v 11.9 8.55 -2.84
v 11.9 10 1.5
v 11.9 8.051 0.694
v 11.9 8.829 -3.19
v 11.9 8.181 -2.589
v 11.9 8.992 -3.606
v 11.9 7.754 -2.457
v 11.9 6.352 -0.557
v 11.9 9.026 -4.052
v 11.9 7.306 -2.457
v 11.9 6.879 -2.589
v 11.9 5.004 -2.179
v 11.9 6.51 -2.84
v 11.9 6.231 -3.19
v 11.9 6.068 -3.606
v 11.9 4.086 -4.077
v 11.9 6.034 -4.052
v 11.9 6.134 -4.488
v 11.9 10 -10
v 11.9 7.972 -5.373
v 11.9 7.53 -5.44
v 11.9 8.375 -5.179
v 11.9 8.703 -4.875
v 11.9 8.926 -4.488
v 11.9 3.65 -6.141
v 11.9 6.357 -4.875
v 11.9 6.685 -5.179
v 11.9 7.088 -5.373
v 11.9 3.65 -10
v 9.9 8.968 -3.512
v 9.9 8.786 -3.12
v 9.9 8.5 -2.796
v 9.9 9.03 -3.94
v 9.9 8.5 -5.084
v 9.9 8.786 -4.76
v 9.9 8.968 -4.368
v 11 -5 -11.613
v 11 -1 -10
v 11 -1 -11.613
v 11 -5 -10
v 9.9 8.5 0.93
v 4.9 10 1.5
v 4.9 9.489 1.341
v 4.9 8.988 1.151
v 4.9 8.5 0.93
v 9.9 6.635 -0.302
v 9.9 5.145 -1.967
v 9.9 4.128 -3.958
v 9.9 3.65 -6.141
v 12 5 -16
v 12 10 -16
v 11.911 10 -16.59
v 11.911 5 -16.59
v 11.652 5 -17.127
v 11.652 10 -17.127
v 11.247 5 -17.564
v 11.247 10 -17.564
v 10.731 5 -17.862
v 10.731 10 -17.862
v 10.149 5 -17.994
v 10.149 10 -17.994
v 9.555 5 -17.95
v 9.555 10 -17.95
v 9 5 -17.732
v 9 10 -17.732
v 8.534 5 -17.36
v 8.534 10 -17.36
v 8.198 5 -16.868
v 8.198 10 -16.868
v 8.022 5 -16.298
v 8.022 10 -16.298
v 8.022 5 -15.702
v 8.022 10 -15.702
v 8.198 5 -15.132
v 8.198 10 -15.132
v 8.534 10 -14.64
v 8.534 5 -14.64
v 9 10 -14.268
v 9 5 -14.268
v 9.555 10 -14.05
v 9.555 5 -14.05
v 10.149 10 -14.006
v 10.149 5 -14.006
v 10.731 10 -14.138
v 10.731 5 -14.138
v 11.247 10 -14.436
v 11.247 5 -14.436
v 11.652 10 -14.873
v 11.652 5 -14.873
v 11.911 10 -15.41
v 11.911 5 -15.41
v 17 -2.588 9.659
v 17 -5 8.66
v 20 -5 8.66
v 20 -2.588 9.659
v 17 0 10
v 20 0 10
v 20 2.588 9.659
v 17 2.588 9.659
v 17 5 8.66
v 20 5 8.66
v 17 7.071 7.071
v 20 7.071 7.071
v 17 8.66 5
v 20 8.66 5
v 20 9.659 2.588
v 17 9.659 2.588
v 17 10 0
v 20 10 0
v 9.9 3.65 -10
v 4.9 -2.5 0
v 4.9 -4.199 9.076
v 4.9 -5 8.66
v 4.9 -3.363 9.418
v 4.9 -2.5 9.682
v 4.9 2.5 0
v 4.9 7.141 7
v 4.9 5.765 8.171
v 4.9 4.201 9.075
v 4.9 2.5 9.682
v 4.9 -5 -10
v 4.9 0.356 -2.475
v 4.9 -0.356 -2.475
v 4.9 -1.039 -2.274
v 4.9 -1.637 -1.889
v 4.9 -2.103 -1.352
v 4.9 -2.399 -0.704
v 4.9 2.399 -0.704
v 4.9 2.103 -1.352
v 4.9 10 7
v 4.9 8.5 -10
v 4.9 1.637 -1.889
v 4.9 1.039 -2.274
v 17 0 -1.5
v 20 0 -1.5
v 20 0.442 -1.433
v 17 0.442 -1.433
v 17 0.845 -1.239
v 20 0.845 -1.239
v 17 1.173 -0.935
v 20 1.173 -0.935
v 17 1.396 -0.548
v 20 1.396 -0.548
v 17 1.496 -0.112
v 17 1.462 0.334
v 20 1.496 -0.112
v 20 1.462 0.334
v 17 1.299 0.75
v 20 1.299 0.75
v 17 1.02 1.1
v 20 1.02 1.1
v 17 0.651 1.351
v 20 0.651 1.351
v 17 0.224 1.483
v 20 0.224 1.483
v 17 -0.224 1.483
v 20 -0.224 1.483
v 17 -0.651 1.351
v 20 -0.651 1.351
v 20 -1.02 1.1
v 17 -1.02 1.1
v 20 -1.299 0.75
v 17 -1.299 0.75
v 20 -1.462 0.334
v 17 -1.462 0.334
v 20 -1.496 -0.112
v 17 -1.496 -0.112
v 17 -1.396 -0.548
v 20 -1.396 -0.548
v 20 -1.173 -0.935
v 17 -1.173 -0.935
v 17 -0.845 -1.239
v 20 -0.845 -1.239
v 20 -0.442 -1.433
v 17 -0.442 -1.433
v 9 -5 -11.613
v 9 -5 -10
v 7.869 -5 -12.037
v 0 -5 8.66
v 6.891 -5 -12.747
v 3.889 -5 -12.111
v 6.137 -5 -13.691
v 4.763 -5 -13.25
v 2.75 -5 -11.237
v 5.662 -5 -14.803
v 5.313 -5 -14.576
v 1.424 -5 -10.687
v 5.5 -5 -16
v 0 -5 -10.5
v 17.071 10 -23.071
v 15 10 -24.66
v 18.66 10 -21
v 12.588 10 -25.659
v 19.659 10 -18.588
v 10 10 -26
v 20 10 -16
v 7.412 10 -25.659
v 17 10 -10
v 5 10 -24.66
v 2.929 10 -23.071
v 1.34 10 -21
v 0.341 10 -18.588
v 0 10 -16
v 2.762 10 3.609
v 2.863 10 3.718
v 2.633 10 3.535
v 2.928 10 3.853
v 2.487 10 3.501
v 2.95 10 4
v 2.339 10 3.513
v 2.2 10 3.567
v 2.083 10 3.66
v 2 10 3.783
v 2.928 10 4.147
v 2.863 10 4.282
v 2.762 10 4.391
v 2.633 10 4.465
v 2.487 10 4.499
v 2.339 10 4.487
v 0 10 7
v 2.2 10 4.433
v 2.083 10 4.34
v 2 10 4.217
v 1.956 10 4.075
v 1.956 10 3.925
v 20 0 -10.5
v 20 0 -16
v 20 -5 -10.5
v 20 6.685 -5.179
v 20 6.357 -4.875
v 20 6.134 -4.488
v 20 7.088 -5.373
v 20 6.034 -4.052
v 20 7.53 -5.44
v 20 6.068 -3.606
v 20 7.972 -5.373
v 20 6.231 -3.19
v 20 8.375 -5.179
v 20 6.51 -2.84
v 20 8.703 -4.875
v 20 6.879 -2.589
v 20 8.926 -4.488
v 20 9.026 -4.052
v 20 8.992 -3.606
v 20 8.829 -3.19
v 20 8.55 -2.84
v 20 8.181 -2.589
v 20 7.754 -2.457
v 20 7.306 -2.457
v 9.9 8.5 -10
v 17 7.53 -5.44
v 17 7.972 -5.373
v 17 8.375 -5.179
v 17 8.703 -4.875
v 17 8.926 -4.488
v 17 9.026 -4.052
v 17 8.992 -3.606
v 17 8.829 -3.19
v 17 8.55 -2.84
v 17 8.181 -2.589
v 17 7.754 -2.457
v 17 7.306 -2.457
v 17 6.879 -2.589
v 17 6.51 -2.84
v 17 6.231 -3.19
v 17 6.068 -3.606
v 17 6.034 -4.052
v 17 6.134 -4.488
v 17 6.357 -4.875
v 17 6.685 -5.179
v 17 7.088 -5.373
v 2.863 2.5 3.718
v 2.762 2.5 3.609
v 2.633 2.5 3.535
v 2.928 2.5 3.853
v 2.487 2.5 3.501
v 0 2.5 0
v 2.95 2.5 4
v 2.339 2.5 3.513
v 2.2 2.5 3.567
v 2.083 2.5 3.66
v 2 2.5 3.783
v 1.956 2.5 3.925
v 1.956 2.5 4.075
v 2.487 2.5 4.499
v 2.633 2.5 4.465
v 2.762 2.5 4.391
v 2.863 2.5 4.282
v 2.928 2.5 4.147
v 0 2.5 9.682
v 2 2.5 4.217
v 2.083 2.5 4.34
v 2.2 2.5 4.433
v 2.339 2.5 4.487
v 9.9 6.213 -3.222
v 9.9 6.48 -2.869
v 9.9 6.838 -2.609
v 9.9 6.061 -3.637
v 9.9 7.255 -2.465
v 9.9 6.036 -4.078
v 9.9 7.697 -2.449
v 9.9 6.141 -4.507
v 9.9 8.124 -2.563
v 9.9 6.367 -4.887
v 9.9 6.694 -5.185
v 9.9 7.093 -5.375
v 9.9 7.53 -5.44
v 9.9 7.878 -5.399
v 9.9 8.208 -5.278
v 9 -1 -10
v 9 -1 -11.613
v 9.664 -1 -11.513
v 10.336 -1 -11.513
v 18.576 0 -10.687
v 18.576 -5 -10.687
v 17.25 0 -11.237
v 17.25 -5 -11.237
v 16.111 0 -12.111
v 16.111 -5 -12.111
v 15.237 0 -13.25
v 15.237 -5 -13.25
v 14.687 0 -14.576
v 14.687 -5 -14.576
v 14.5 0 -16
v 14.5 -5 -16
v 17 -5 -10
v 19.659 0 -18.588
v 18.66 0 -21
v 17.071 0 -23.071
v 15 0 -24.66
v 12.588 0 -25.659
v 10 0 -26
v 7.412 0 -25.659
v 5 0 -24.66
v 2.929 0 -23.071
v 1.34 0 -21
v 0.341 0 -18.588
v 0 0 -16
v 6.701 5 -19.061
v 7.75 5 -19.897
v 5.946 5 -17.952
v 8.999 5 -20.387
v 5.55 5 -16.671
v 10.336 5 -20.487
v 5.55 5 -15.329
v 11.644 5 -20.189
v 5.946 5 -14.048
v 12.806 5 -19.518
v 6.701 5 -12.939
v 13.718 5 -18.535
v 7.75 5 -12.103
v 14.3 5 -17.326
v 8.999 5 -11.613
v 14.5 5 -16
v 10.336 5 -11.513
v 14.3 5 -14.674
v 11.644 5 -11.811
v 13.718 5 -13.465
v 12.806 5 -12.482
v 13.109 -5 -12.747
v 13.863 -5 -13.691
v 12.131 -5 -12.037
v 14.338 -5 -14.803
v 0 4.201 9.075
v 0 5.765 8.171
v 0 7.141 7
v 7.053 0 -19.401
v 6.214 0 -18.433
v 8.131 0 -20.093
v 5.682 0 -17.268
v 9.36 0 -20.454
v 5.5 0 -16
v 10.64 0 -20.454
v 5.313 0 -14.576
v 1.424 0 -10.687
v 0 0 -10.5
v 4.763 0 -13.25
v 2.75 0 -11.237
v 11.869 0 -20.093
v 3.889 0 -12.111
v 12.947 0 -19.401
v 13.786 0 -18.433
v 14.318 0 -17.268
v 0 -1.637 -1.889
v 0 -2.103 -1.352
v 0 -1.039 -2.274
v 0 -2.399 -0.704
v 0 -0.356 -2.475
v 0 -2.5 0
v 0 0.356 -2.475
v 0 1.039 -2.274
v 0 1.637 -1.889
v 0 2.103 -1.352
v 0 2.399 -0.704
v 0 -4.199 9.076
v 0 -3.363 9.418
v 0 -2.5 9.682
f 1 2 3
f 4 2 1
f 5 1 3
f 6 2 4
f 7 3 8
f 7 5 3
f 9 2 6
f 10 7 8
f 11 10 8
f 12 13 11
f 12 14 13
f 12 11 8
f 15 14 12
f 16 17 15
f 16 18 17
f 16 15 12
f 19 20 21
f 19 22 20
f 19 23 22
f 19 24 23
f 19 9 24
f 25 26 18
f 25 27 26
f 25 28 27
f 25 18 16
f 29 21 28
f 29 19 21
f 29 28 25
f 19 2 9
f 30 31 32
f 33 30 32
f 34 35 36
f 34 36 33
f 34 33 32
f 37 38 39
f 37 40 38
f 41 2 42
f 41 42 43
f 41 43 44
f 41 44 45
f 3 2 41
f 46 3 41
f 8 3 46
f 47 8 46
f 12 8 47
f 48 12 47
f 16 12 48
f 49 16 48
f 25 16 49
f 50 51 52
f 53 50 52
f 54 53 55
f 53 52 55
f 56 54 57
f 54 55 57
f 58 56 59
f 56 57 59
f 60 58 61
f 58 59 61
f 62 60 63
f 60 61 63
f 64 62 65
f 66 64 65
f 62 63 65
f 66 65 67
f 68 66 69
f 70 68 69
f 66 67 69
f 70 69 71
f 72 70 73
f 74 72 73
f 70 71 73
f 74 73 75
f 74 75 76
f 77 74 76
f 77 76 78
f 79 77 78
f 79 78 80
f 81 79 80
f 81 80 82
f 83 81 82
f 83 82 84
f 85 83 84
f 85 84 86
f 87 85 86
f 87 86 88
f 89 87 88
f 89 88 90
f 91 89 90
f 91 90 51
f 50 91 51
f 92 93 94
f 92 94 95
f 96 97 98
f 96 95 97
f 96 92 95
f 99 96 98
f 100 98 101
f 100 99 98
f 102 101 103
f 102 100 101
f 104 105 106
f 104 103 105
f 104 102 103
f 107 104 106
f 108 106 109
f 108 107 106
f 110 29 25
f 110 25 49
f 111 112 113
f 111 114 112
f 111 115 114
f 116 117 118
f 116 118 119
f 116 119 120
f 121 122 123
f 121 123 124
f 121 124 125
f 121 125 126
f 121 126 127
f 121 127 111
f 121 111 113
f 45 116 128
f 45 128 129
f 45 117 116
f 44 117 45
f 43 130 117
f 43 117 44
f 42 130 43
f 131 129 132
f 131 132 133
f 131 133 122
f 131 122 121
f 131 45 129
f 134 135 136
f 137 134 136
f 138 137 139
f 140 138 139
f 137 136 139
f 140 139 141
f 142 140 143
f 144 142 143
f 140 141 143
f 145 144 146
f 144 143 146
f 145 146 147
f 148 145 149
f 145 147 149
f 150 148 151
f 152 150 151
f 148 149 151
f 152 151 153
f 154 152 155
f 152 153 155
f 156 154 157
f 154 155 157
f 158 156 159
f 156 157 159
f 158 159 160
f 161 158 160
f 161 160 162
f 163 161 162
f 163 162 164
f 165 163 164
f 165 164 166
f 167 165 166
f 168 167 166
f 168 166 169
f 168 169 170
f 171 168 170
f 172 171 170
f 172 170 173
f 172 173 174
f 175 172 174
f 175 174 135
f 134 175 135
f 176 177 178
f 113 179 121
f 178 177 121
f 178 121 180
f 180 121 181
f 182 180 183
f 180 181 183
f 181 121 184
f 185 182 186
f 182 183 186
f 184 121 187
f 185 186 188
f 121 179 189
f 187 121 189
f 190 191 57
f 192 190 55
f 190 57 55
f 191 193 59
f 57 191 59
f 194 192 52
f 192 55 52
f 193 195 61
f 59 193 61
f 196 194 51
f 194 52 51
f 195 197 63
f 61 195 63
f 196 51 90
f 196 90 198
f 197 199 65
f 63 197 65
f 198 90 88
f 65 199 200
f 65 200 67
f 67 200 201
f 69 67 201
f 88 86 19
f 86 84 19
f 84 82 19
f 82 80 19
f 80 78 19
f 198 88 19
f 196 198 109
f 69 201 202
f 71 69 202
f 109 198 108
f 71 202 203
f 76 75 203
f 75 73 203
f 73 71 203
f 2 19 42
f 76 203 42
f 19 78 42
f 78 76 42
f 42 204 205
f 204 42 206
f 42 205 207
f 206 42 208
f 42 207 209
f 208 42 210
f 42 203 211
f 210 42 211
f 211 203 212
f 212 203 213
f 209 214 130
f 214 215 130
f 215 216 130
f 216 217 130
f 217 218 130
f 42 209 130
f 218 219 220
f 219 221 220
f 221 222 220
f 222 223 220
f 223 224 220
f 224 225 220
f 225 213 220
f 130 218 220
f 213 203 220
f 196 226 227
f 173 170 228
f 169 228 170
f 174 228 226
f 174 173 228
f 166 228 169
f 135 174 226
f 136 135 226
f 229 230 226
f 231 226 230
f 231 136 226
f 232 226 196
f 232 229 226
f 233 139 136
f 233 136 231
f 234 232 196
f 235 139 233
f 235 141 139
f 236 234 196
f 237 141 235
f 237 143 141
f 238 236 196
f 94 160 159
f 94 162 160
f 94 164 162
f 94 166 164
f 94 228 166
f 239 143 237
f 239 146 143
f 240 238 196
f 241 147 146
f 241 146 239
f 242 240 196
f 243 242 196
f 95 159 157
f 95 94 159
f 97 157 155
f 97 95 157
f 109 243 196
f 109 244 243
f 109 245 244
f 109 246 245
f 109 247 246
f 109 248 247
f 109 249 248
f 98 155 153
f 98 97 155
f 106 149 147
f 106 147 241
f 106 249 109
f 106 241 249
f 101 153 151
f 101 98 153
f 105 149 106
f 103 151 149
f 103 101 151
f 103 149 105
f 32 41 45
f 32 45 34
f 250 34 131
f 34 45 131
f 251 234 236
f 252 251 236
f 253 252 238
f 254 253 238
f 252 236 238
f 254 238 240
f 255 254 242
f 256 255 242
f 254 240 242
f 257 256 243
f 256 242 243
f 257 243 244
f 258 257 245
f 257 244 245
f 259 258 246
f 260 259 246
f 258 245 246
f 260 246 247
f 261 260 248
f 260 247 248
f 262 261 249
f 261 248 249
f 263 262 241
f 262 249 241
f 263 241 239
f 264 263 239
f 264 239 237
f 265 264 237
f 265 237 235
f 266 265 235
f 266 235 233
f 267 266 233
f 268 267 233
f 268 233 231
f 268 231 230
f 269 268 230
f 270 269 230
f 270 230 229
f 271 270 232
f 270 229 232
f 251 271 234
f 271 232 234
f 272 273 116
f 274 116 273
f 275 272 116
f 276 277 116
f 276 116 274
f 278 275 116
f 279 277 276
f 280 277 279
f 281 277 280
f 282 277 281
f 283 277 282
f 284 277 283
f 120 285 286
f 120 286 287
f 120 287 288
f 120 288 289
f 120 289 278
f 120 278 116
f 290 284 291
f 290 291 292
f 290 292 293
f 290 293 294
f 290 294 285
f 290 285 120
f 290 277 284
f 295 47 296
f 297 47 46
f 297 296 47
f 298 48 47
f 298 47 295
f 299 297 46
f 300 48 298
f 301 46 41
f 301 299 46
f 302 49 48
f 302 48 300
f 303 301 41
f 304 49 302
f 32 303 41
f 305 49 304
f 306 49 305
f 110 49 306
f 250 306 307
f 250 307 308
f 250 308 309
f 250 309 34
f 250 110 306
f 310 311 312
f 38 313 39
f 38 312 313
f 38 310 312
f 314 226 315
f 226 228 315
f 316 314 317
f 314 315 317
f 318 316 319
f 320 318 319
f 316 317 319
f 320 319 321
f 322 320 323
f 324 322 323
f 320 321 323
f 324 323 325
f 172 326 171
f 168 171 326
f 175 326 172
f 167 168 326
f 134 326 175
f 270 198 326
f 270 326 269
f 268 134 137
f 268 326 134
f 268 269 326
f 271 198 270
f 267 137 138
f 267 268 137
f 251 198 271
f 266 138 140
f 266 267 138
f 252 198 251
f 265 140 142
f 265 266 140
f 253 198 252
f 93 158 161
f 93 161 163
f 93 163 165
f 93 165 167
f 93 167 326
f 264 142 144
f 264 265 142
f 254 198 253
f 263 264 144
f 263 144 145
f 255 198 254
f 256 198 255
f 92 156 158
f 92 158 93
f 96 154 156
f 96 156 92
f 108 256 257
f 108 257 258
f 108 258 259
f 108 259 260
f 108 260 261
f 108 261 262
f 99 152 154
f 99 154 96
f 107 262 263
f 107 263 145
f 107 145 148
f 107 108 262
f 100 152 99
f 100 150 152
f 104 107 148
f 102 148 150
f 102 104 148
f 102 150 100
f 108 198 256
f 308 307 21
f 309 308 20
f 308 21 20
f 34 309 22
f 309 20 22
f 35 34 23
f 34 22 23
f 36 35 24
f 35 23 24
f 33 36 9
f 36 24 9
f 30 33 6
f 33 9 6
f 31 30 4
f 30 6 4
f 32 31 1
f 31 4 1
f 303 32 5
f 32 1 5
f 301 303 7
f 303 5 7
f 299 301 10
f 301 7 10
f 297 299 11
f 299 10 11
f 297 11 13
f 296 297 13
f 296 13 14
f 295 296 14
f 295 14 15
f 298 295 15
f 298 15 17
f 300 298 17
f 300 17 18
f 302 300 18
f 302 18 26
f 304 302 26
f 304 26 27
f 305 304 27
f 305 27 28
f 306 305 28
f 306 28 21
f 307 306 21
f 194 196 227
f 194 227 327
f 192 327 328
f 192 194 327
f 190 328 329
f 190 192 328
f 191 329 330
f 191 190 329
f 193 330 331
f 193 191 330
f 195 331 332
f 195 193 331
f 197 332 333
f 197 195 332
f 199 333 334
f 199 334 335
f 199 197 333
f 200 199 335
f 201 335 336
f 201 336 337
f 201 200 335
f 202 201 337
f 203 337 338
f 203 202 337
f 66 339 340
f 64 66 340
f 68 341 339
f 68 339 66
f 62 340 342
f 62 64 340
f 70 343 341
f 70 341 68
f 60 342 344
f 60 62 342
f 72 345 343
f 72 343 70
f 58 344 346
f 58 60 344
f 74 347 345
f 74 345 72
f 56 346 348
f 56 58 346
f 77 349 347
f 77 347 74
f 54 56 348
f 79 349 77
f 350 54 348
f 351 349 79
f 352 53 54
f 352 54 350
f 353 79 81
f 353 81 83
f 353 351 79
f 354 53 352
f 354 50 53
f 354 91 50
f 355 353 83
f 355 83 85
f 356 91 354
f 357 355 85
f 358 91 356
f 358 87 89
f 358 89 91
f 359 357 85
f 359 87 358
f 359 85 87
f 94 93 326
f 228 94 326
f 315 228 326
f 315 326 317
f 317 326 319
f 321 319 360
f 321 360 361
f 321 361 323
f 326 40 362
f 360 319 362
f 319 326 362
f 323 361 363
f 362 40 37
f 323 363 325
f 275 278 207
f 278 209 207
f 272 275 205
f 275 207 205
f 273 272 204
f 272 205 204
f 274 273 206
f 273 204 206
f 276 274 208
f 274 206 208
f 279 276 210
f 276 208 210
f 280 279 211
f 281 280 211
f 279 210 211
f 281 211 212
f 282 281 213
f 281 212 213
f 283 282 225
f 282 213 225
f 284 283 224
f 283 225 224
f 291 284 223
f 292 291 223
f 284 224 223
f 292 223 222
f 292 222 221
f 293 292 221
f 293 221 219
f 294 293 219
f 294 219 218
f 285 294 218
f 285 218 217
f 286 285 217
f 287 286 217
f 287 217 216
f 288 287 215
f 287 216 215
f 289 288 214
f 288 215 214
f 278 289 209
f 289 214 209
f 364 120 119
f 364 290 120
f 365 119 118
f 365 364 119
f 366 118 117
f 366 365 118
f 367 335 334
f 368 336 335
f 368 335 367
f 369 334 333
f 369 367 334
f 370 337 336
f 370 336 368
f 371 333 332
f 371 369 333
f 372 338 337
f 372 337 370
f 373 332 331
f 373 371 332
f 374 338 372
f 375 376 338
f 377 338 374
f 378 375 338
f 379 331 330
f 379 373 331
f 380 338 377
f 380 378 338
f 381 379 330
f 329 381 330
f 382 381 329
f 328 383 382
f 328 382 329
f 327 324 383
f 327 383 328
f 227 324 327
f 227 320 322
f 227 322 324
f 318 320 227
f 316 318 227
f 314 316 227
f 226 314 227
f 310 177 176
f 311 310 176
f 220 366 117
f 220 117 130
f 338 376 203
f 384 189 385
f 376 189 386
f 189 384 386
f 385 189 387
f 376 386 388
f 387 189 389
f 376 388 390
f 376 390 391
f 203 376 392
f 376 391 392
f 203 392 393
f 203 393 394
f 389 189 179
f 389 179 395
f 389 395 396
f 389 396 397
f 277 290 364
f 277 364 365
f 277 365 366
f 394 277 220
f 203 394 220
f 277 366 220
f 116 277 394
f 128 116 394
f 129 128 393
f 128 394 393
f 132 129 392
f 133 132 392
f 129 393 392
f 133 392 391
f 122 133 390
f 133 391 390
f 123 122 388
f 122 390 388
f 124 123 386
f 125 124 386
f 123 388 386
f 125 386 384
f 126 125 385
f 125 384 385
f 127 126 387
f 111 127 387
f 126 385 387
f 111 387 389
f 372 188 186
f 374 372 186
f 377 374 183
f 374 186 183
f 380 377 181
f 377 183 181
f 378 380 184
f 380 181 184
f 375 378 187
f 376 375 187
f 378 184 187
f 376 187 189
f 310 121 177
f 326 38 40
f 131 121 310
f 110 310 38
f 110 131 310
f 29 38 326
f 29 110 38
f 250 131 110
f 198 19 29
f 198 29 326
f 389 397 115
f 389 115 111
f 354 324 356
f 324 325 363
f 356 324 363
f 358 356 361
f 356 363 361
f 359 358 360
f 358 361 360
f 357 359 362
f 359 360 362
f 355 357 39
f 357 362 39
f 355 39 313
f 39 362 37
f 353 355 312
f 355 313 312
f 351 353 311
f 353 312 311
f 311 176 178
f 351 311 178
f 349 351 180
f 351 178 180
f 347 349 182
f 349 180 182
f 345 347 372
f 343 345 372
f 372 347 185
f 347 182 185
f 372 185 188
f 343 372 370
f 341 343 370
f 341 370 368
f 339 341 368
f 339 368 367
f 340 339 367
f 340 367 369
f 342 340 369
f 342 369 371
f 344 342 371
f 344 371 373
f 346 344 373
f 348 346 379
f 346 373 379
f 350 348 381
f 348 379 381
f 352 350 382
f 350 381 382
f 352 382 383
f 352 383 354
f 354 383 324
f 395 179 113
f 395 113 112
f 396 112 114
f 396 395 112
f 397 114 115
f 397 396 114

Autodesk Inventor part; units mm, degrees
ref_plane "YZ Plane" through (0, 0, 0) normal (1, 0, 0) x (0, 1, 0)
ref_plane "XZ Plane" through (0, 0, 0) normal (0, 1, 0) x (-1, 0, 0)
ref_plane "XY Plane" through (0, 0, 0) normal (0, 0, 1) x (1, 0, 0)
sketch "Sketch1" plane through (0, 0, 0) normal (1, 0, 0) x (0, 1, 0)
  point P0 (0, 0)
sketch "Sketch2" plane through (0, 0, 0) normal (1, 0, 0) x (0, 1, 0)
  arc A0 (10, 0) -> (-10, 0) centre (0, 0) ccw
  circle A1 centre (0, 0) radius 1.5
  line L0 (10, 0) -> (-10, 0)
  line L1 (-10, 0) -> (-10, -16)
  line L2 (0, -26) -> (10, -26)
  line L3 (10, -26) -> (10, 0)
  line L4 (0, -26) -> (0, -16)
  line L5 (0, -16) -> (-10, -16)
  dimension "d1" = 3
extrude "Extrusion1" add sketch "Sketch2" along normal blind 20
sketch "Sketch3" plane through (0, 10, 0) normal (0, 1, 0) x (1, 0, 0)
  line L0 (0, 26) -> (20, 26) projected
  line L1 (0, 16) -> (20, 16) projected
  arc A0 (20, 16) -> (0, 16) centre (10, 16) ccw
  line L2 (21.9475, 16) -> (-2.9161, 16)
  line L3 (-2.9161, 16) -> (-2.9161, 27.442)
  line L4 (-2.9161, 27.442) -> (21.9475, 27.442)
  line L5 (21.9475, 27.442) -> (21.9475, 16)
  point P0 (0, 0)
extrude "Extrusion2" cut sketch "Sketch3" against normal blind 20 contours L2 L3 L4 L5 A0
sketch "Sketch5" plane through (0, 10, 0) normal (0, 1, 0) x (1, 0, 0)
  line L0 (0, -10) -> (20, -10) projected
  line L1 (0, -10) -> (4.9, -10)
  line L2 (4.9, -10) -> (4.9, 10)
  line L3 (4.9, 10) -> (17, 10)
  line L4 (17, 10) -> (17, -10)
  line L5 (17, -10) -> (4.9, -10)
  point P0 (0, 0)
  dimension "d10" = 4.9
  dimension "d11" = 20
  dimension "d12" = 12.1
extrude "Extrusion3" cut sketch "Sketch5" against normal blind 20
sketch "Sketch6" plane through (0, 0, 0) normal (-1, 0, 0) x (0, 0, 1)
  arc A0 (0, 2.5) -> (0, -2.5) centre (0, 0) ccw
  line L0 (0, 2.5) -> (12.401, 2.5)
  line L1 (12.401, 2.5) -> (12.401, -2.5)
  line L2 (12.401, -2.5) -> (0, -2.5)
  dimension "d15" = 5
extrude "Extrusion4" cut sketch "Sketch6" against normal blind 5
sketch "Sketch7" plane through (0, 0, 0) normal (-1, 0, 0) x (0, 0, 1)
  line L0 (-16, -10) -> (12.5782, -10)
  line L1 (12.5782, -10) -> (12.5782, -5)
  line L2 (12.5782, -5) -> (-16, -5)
  line L3 (-16, -5) -> (-16, -10)
  point P0 (0, 0)
  dimension "d18" = 5
extrude "Extrusion5" cut sketch "Sketch7" against normal through all
sketch "Sketch8" plane through (0, 10, 0) normal (0, 1, 0) x (1, 0, 0)
  line L0 (0, 16) -> (20, 16) projected
  circle A0 centre (10, 16) radius 2
  point P0 (0, 0)
  dimension "d21" = 4
extrude "Extrusion6" cut sketch "Sketch8" against normal through all
sketch "Sketch9" plane through (0, -5, -16) normal (0, -1, 0) x (1, 0, 0)
  line L0 (0, 0) -> (8, 0) projected
  line L1 (12, 0) -> (20, 0) projected
  line L2 (8, 0) -> (12, 0)
  circle A0 centre (10, 0) radius 4.5
  point P0 (0, 16)
  dimension "d24" = 9
extrude "Extrusion7" cut sketch "Sketch9" against normal blind 10
sketch "Sketch12" plane through (0, -5, -16) normal (0, -1, 0) x (1, 0, 0)
  arc A0 (14.5, 0) -> (5.5, 0) centre (10, 0) ccw projected
  line L0 (4.9, 6) -> (17, 6) projected
  line L1 (9, 6) -> (9, 4.2062)
  line L2 (11, 6) -> (11, 4.2062)
  line L3 (9, 4.2062) -> (11, 4.2062)
  line L4 (9, 6) -> (11, 6)
  point P0 (0, 16)
extrude "Extrusion8" cut sketch "Sketch12" against normal blind 4
sketch "Sketch13" plane through (0, -5, -16) normal (0, -1, 0) x (1, 0, 0)
  arc A0 (5.5, 0) -> (-5.5, 0) centre (0, 0) ccw
  arc A1 (25.5, 0) -> (14.5, 0) centre (20, 0) ccw
  line L0 (26.0588, 0) -> (26.0588, -15.4765)
  line L1 (26.0588, -15.4765) -> (-5.5, -15.4765)
  line L2 (-5.5, -15.4765) -> (-5.5, 0)
  line L3 (5.5, 0) -> (14.5, 0)
  line L4 (25.5, 0) -> (26.0588, 0)
  point P0 (0, 16)
  dimension "d33" = 11
  dimension "d34" = 11
extrude "Extrusion9" cut sketch "Sketch13" against normal blind 5
sketch "Sketch14" plane through (20, 0, 0) normal (1, 0, 0) x (0, 0, -1)
  circle A0 centre (3.94, 7.53) radius 1.5
  point P0 (0, 0)
  point P1 (0, 10)
  dimension "d39" = 3
extrude "Extrusion10" cut sketch "Sketch14" against normal blind 5
sketch "Sketch15" plane through (20, 0, 0) normal (1, 0, 0) x (0, 0, -1)
  circle A0 centre (0, 0) radius 1.5
  dimension "d43" = 3
extrude "Extrusion11" cut sketch "Sketch15" against normal blind 5
sketch "Sketch16" plane through (4.9, 10, 0) normal (1, 0, 0) x (0, 0, -1)
  line L0 (0, 0) -> (-1.5, 0)
  line L1 (-1.5, 0) -> (-1.5, -1.5)
  line L2 (-1.5, -1.5) -> (11.5, -1.5)
  line L3 (11.5, -1.5) -> (11.5, 0)
  line L4 (16, 0) -> (0, 0) projected
  line L5 (11.5, 0) -> (0, 0)
  point P0 (0, -10)
  dimension "d46" = 1.5
  dimension "d47" = 1.5
  dimension "d48" = 13
extrude "Extrusion12" add sketch "Sketch16" along normal blind 7
sketch "Sketch17" plane through (0, 0, 0) normal (-1, 0, 0) x (0, 0, 1)
  line L0 (9.6825, 2.5) -> (0, 2.5) projected
  line L1 (0, 2.5) -> (7, 2.5)
  line L2 (7, 2.5) -> (7, 10)
  line L3 (7, 10) -> (0, 10)
  line L4 (0, 10) -> (0, 2.5)
  point P0 (0, 0)
  dimension "d51" = 7
  dimension "d52" = 7.5
extrude "Extrusion13" add sketch "Sketch17" against normal blind 4.9
sketch "Sketch18" plane through (10, 10, -16) normal (0, 1, 0) x (1, 0, 0)
  circle A0 centre (-7.55, -20) radius 0.5
  line L0 (-5.1, -23) -> (-10, -23) projected
  line L1 (-7.55, -23) -> (-7.55, -20)
  point P0 (-10, -16)
  dimension "d55" = 1
  dimension "d58" = 3
extrude "Extrusion14" cut sketch "Sketch18" against normal up to next
sketch "Sketch19" plane through (17, -5, -10) normal (0, 0, 1) x (1, 0, 0)
  line L0 (-5.1, 13.5) -> (-12.1, 13.5) projected
  line L1 (-5.1, 13.5) -> (-5.1, 8.65)
  line L2 (-5.1, 8.65) -> (-7.1, 8.65)
  line L3 (-7.1, 8.65) -> (-7.1, 13.5)
  line L4 (-5.1, 15) -> (-5.1, 13.5) projected
  line L5 (-7.1, 13.5) -> (-5.1, 13.5)
  point P0 (-17, 5)
  dimension "d59" = 4.85
  dimension "d60" = 2
extrude "Extrusion15" add sketch "Sketch19" along normal blind 12
sketch "Sketch20" plane through (11.9, 10, 0) normal (1, 0, 0) x (0, 0, -1)
  circle A0 centre (3.94, -2.47) radius 1.5 projected
  circle A1 centre (3.94, -2.47) radius 1.5
  point P0 (0, -10)
extrude "Extrusion16" cut sketch "Sketch20" against normal blind 2
sketch "Sketch21" plane through (11.9, 10, 0) normal (1, 0, 0) x (0, 0, -1)
  line L0 (-7.3238, -1.5) -> (-7.3238, -7.2177)
  line L1 (-7.3238, -7.2177) -> (-1.5, -7.2177)
  line L2 (-1.5, -7.2177) -> (4.1962, -7.2177)
  line L3 (10, -6.35) -> (-2, -6.35) projected
  line L4 (-1.5, 0) -> (-1.5, -1.5) projected
  line L5 (-1.5, 0) -> (-7.3238, 0)
  line L6 (-7.3238, 0) -> (-7.3238, -1.5)
  line L7 (-1.5, -0.1522) -> (-1.5, 0)
  line L8 (4.1962, -7.2177) -> (6.1782, -7.2177)
  line L9 (6.1782, -7.2177) -> (6.1782, -6.35)
  arc A0 (-1.5, 0) -> (6.141, -6.35) centre (6.8954, 2.33) ccw
  point P0 (0, -10)
  point P1 (4.1962, -6.35)
  point P2 (3.0513, -6.35)
extrude "Extrusion17" cut sketch "Sketch21" against normal blind 7
properties part number "knuckle"
